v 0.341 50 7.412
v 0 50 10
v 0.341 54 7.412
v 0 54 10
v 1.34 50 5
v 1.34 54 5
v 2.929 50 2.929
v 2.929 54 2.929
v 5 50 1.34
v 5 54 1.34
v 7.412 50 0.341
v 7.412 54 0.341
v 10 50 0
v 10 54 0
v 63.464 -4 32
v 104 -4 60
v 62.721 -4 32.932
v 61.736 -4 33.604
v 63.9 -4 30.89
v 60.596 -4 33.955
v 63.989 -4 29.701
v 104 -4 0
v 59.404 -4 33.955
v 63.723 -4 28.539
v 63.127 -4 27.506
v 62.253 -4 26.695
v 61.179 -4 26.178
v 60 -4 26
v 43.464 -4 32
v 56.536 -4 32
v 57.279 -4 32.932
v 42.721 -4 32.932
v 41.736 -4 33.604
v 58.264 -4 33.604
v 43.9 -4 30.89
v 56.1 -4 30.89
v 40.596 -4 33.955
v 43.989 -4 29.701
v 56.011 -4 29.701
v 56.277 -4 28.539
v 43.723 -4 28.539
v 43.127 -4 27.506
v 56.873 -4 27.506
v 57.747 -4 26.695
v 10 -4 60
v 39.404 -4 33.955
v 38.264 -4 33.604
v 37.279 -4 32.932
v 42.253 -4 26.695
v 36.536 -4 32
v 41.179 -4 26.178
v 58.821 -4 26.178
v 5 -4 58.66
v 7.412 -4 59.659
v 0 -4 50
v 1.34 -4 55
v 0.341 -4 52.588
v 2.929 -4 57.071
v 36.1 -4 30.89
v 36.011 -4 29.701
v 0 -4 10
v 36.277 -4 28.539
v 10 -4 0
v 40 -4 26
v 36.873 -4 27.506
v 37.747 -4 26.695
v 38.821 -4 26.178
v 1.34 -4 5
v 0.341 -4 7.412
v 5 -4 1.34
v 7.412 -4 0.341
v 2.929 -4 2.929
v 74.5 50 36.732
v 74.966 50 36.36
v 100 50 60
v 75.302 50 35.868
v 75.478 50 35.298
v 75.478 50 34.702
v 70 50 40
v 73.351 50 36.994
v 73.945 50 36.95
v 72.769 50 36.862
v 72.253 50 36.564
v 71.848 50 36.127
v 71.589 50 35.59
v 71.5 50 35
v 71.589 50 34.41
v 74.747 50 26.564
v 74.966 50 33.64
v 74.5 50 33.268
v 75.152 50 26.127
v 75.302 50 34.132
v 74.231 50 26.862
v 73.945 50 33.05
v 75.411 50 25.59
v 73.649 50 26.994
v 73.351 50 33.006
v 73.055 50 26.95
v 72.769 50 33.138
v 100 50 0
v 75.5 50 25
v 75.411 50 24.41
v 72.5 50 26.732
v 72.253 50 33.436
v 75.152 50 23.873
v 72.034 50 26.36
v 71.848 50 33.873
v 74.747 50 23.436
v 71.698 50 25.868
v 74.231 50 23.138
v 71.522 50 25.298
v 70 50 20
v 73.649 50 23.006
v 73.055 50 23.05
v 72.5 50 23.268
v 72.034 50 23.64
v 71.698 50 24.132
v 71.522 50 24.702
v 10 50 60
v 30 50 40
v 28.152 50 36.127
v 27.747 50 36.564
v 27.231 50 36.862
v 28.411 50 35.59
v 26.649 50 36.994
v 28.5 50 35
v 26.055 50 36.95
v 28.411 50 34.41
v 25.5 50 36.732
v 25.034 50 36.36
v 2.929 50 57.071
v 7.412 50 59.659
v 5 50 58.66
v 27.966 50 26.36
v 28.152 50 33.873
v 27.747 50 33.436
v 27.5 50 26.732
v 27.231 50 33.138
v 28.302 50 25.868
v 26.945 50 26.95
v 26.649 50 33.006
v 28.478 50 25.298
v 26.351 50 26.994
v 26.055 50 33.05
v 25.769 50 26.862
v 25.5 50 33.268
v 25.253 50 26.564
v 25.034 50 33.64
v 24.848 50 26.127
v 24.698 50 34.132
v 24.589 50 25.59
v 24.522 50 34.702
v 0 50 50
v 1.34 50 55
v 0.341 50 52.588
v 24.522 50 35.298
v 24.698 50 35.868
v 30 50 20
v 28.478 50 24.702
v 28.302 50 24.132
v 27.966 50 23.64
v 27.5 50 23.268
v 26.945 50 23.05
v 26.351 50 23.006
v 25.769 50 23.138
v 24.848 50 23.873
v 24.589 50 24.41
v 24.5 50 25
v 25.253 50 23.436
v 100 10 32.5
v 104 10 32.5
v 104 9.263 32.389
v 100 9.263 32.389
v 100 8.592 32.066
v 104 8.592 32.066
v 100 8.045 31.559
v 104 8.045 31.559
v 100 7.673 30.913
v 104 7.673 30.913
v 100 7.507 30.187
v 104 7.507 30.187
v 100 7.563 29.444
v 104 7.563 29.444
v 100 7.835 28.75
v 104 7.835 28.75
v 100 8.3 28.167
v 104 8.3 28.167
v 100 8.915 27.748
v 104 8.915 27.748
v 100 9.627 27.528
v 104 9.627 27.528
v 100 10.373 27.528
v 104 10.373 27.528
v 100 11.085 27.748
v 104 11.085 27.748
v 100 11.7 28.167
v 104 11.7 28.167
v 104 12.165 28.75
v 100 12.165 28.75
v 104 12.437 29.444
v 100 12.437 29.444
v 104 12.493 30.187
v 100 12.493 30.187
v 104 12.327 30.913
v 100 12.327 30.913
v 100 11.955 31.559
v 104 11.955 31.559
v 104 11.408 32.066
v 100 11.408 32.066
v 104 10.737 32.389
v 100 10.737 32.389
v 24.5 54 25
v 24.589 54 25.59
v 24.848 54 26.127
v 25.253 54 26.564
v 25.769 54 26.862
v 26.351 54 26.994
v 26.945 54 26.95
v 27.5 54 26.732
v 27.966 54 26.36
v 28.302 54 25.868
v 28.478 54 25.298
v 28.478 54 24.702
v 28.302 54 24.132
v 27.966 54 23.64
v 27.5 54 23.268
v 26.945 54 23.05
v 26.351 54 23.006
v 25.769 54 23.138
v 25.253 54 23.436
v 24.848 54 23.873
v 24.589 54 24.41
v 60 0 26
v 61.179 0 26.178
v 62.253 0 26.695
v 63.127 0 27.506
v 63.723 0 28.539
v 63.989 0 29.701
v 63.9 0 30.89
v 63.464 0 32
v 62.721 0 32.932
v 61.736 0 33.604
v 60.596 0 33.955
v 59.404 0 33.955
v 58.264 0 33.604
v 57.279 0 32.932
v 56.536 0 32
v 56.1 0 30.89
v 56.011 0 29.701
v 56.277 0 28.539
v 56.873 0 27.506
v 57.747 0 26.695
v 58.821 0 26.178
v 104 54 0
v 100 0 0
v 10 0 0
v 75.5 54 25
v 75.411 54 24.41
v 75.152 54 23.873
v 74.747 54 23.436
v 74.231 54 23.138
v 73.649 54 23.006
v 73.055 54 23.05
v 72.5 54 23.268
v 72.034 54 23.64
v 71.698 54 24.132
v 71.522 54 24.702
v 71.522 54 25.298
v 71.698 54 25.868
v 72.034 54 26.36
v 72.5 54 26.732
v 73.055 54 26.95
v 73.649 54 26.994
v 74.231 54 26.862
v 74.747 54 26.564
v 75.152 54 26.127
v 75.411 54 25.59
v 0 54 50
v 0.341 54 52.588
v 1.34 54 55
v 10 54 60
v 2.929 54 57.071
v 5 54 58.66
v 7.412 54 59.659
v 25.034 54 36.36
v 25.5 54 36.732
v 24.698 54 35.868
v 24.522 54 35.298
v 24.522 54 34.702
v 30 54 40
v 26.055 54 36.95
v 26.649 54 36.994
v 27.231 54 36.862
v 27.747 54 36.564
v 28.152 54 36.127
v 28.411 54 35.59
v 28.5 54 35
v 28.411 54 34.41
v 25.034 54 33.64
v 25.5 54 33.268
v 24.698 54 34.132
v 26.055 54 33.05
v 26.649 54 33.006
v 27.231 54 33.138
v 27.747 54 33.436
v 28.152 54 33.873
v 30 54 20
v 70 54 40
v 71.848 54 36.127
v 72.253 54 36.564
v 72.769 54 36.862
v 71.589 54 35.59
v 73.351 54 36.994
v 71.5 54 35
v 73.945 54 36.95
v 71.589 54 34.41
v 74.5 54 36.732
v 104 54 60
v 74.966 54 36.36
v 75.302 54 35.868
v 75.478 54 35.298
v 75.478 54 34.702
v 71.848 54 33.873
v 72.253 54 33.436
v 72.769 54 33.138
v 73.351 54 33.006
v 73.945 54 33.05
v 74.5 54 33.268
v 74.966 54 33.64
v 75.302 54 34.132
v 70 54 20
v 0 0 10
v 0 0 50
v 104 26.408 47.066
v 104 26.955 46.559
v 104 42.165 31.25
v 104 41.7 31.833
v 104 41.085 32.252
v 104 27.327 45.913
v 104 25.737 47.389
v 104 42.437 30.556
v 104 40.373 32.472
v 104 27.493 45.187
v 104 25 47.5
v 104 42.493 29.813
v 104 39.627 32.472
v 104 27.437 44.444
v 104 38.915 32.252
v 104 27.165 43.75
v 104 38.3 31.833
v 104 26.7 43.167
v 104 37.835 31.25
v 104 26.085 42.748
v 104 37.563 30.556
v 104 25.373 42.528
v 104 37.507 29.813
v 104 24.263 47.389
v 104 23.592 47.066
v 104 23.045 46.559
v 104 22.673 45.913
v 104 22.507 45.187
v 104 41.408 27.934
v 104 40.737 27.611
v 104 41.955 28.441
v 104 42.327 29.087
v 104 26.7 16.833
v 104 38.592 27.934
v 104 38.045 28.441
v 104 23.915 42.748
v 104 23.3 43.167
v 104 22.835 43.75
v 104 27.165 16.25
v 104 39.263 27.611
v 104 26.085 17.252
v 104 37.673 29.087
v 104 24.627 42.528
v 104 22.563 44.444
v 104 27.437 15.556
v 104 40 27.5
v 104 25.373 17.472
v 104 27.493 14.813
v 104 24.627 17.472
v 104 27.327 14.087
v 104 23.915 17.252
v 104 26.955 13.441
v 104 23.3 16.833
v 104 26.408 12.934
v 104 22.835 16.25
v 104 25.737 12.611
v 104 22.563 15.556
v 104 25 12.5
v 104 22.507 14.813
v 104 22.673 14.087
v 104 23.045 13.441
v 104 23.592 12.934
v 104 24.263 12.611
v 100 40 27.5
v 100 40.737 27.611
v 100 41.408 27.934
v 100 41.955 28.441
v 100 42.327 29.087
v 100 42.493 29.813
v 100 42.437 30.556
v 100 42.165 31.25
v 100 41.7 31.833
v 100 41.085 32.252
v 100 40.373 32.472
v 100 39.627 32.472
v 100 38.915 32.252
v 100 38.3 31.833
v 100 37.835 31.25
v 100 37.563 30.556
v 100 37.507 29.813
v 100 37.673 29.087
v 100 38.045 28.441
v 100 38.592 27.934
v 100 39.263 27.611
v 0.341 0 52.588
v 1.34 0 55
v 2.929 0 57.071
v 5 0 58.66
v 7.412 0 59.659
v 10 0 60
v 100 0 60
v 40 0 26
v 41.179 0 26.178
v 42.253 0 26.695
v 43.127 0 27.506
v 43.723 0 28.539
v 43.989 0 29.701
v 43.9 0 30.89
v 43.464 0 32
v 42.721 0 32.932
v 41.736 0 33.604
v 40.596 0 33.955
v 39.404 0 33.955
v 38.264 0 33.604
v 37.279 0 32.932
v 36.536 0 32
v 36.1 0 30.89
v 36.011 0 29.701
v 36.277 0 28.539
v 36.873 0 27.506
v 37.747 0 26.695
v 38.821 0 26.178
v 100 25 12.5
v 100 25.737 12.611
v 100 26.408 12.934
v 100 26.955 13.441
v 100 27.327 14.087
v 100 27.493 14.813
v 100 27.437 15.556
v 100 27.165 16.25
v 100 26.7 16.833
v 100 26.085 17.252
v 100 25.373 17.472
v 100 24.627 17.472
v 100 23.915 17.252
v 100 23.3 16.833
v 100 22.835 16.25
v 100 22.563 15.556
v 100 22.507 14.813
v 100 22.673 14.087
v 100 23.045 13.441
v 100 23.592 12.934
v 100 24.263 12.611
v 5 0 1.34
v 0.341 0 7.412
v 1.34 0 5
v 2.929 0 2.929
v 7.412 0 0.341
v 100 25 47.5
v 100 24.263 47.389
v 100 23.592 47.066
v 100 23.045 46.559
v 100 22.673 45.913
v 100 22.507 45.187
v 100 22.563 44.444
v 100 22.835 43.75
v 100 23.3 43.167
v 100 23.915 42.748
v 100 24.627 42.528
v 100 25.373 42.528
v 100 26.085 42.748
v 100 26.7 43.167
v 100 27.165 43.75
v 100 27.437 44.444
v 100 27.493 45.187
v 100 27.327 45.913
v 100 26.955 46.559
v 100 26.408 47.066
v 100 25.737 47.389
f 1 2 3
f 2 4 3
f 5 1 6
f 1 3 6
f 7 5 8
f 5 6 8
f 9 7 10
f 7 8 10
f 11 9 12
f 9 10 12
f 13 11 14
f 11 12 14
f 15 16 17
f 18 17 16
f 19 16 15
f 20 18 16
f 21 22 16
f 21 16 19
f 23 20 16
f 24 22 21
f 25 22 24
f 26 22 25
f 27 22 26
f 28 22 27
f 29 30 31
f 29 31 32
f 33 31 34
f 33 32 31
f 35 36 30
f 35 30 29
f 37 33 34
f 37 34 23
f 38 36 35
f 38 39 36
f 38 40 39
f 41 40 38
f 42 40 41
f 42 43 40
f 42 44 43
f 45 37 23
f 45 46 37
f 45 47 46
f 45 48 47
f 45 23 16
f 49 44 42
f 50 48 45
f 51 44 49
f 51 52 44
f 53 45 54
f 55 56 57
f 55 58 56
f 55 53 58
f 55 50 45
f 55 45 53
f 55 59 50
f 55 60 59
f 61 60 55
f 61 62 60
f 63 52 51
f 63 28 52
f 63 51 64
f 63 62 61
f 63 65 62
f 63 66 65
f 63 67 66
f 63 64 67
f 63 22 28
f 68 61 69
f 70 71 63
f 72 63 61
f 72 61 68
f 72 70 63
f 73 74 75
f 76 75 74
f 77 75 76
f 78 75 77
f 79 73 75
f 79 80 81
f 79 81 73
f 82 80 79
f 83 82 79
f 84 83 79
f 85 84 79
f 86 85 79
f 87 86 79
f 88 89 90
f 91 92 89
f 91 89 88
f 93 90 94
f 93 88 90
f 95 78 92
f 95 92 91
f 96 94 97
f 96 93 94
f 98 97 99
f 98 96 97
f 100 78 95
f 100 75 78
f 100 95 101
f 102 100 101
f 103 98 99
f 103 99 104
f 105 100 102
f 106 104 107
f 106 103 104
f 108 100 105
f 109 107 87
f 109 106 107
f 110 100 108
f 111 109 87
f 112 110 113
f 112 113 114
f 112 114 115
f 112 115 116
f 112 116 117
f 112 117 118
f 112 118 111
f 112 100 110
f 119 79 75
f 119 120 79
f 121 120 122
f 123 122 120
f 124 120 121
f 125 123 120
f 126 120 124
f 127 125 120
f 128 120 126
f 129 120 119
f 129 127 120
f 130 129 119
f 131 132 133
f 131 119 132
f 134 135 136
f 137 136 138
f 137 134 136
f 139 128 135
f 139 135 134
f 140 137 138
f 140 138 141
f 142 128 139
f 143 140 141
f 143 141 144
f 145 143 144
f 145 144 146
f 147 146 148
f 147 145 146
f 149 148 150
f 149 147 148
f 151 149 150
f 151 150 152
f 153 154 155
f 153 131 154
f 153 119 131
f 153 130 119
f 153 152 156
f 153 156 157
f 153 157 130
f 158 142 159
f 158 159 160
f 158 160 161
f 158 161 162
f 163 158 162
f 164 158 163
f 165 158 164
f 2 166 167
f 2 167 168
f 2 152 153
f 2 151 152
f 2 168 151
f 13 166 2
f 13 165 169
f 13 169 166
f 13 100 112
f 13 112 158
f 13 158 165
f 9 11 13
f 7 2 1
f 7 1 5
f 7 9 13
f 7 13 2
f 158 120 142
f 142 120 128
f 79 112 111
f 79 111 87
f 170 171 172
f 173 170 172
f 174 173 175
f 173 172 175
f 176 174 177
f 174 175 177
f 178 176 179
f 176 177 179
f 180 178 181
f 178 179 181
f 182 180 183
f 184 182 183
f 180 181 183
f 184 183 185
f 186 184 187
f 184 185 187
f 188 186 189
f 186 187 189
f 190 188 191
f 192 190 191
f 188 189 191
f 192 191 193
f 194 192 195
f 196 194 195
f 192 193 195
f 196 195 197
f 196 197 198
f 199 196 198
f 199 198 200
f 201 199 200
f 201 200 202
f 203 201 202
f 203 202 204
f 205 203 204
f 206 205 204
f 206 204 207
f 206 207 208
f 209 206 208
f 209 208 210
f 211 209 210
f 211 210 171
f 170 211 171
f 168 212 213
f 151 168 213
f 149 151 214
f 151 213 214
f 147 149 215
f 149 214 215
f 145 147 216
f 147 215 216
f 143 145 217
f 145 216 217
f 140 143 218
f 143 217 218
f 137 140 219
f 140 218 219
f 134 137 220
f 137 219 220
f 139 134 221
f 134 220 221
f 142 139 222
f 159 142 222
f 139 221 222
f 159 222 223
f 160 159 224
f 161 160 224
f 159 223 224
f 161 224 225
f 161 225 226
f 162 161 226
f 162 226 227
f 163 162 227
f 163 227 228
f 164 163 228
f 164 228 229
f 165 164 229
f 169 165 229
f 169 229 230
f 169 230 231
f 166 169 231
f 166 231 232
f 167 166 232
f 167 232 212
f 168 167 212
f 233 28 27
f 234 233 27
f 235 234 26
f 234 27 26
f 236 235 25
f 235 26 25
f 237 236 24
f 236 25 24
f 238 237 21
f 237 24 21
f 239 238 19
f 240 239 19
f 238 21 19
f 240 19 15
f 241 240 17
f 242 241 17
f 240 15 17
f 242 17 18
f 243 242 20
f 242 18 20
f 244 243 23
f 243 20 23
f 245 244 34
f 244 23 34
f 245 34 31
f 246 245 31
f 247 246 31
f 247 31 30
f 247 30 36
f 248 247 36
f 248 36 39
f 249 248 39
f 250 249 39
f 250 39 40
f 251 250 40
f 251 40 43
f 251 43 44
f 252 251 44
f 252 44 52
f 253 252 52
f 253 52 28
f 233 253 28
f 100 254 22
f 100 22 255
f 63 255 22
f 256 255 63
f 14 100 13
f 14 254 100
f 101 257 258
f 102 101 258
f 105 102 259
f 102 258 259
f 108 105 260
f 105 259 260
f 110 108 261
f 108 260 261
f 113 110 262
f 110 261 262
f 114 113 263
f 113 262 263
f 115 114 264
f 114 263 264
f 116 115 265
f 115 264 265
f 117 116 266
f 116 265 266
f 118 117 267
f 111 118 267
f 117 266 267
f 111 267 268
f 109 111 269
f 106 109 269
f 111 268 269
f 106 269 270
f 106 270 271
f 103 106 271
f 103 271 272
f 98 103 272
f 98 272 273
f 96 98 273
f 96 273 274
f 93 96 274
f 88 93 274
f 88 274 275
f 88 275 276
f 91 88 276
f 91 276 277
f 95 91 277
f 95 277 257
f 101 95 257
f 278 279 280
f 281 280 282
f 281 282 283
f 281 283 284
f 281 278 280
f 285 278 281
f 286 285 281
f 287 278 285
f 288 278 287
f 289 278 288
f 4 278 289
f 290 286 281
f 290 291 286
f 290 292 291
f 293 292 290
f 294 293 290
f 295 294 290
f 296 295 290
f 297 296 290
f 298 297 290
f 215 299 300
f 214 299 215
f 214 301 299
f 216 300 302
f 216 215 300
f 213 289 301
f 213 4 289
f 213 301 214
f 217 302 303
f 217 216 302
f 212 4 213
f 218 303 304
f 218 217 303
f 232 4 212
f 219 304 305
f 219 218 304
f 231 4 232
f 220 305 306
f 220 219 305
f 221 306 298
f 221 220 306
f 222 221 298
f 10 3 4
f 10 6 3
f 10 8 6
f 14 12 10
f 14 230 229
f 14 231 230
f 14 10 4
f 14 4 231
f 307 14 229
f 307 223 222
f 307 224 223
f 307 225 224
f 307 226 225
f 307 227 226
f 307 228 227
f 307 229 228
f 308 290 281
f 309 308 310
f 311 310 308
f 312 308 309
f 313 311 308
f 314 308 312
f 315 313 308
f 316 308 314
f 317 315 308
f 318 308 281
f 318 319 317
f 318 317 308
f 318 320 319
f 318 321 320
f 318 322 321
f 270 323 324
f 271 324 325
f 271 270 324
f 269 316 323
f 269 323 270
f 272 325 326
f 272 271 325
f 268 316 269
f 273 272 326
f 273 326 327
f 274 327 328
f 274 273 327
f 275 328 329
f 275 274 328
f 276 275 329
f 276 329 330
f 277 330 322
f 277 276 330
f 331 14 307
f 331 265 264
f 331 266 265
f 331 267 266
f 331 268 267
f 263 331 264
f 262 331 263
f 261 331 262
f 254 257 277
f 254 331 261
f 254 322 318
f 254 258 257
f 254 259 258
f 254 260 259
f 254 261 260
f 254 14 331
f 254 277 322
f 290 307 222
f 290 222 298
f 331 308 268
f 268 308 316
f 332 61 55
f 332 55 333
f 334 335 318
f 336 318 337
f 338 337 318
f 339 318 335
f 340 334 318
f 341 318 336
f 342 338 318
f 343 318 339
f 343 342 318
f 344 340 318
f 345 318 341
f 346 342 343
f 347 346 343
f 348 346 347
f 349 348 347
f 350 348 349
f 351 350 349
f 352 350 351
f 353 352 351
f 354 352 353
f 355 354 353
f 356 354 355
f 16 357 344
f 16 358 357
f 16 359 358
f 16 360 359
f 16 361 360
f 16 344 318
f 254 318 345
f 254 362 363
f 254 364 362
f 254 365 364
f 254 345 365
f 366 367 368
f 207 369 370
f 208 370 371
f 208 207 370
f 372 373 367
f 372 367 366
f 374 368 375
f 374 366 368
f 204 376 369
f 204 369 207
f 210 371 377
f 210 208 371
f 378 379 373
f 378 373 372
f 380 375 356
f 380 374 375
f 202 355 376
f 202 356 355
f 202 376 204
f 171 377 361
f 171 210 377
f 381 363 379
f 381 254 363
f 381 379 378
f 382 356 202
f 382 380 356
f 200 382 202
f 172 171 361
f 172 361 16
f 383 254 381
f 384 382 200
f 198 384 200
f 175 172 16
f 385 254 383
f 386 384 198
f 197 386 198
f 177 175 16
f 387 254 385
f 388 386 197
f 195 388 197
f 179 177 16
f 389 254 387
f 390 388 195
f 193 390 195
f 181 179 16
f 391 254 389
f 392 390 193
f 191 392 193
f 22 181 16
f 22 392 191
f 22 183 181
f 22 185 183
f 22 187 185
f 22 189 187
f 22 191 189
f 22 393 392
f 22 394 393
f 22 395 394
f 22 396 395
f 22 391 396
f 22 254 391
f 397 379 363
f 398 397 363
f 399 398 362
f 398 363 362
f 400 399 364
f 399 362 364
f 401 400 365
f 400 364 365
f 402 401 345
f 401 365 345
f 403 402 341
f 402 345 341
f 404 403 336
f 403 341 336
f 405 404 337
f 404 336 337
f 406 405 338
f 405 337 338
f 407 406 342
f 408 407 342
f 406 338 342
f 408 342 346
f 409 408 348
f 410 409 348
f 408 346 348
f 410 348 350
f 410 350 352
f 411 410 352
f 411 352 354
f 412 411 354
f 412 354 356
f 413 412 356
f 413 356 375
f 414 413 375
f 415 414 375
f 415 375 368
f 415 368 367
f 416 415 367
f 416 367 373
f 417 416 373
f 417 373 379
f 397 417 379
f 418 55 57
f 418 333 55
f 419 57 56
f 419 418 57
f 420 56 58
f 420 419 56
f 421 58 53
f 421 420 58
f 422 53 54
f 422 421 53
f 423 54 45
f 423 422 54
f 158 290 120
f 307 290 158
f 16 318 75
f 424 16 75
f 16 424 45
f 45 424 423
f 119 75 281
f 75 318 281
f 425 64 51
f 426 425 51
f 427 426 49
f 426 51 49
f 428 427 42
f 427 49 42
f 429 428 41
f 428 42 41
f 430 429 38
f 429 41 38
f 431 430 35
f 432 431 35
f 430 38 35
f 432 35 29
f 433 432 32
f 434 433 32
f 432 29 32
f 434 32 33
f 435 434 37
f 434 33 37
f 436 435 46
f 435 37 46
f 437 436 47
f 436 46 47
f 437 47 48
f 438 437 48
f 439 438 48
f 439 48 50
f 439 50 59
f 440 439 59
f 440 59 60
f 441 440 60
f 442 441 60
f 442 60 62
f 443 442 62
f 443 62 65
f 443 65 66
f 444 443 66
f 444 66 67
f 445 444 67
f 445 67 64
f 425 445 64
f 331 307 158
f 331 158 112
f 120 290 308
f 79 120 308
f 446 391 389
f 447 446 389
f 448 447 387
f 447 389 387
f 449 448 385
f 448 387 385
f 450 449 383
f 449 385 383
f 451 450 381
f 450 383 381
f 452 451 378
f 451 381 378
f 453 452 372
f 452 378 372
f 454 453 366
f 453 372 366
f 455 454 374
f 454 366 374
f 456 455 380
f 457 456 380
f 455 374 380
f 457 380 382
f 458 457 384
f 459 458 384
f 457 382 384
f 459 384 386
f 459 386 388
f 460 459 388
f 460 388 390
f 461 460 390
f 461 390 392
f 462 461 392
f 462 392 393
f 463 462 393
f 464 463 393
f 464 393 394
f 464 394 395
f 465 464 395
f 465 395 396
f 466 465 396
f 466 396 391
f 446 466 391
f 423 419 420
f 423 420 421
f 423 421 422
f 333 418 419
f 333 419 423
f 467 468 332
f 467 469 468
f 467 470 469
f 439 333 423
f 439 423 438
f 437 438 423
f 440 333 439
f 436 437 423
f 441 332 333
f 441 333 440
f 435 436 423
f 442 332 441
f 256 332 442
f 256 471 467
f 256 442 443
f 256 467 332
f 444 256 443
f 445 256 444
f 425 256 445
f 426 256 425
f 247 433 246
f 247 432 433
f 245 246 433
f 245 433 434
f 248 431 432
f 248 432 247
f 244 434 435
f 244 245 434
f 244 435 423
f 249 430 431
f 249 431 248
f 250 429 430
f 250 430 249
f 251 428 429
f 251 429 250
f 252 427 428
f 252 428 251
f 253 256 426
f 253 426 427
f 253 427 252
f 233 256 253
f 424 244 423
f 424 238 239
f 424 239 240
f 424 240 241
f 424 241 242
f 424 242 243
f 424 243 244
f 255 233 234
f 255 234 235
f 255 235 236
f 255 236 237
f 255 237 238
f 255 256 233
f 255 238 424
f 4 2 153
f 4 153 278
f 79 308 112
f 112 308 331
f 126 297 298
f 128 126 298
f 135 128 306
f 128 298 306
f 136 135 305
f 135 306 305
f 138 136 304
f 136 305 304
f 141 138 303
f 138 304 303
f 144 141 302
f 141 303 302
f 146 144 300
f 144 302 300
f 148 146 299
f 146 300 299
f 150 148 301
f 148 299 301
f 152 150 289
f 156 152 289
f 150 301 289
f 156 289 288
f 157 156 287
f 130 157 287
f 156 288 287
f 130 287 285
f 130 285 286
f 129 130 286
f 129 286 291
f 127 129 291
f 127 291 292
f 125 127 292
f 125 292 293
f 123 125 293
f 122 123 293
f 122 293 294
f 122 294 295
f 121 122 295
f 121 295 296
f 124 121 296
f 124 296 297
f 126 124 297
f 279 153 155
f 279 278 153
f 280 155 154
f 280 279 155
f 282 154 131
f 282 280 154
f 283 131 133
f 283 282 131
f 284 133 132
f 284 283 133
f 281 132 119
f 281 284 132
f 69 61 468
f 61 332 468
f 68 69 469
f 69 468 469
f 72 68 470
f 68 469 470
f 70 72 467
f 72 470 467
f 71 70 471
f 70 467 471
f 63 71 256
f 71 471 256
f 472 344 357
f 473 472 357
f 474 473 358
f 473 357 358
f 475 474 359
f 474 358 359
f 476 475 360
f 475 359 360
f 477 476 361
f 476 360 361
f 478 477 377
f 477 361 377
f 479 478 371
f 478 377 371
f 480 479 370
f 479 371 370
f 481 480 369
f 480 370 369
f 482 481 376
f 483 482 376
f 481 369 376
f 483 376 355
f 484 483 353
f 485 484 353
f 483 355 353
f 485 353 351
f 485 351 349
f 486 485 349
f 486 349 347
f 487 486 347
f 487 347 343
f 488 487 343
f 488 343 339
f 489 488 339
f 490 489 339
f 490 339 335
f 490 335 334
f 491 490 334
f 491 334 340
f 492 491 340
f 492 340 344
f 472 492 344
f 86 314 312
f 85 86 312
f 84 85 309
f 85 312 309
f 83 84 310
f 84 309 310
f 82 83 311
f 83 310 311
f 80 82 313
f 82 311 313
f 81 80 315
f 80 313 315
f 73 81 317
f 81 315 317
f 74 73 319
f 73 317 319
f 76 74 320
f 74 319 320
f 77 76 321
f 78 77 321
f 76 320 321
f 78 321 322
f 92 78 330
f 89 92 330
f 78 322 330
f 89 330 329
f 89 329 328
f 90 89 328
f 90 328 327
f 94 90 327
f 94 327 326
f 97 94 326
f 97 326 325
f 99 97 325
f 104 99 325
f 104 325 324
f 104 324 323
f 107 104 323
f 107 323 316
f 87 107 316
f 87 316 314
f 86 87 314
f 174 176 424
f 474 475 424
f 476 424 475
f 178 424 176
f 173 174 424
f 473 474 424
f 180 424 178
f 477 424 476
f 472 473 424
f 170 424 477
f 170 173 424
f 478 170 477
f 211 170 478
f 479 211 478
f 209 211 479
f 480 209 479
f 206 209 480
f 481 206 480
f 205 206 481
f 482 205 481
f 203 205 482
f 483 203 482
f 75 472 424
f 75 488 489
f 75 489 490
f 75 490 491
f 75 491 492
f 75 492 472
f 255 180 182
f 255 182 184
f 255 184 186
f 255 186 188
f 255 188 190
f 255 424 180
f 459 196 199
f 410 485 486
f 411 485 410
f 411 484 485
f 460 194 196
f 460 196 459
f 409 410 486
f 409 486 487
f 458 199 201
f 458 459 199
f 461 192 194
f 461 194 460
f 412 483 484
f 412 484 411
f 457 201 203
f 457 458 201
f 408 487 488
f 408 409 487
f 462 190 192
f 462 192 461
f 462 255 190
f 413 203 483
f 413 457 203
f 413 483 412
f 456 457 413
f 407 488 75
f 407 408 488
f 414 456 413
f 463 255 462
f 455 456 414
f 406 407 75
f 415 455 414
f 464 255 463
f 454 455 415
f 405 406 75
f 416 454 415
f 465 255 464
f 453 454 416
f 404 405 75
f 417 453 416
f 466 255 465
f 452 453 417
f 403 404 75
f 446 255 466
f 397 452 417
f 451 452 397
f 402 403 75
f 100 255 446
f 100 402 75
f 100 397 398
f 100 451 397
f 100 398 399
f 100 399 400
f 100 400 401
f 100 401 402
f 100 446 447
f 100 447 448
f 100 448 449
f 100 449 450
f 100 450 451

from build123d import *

# Parameters (mm, degrees)
EKSTR_ZYON_NCE1_DEPTH = 60
RADYUS1_R             = 10
KES_EKSTR_ZYON3_REACH = 133.651
IZIM3_R               = 2.5
KES_EKSTR_ZYON4_REACH = 135.342
IZIM4_R               = 2
IZIM4_W               = 40
IZIM4_H               = 20
KES_EKSTR_ZYON5_REACH = 135.342
IZIM5_R               = 4


with BuildPart() as part:
    # Çizim1 → Ekstrüzyon-İnce1 (new body)
    with BuildSketch(Plane.XY):
        Polygon((0, 0), (100, 0), (100, 50), (0, 50), (0, 54), (104, 54), (104, -4), (0, -4), align=None)
    extrude(amount=EKSTR_ZYON_NCE1_DEPTH)

    # Radyus1
    radyus1_edges = [part.edges().sort_by_distance(p)[0] for p in [
        (0, -2, 60),
        (0, 52, 60),
        (0, -2, 0),
        (0, 52, 0),
    ]]
    fillet(radyus1_edges, radius=RADYUS1_R)

    # Çizim3 → Kes-Ekstrüzyon3 (cut, up to next)
    with BuildSketch(Plane(origin=(104, 0, 0), x_dir=(0, 0, -1), z_dir=(1, 0, 0)), mode=Mode.PRIVATE) as kes_ekstr_zyon3_sk1:
        with Locations((-30, 40)):
            Circle(IZIM3_R)
    kes_ekstr_zyon3_tool1 = extrude(kes_ekstr_zyon3_sk1.sketch, amount=-KES_EKSTR_ZYON3_REACH, mode=Mode.PRIVATE) & part.part
    # Çizim3 → Kes-Ekstrüzyon3 (cut, up to next)
    with BuildSketch(Plane(origin=(104, 0, 0), x_dir=(0, 0, -1), z_dir=(1, 0, 0)), mode=Mode.PRIVATE) as kes_ekstr_zyon3_sk2:
        with Locations(Location((-30, 10, 0), (0, 0, 180))):
            Circle(IZIM3_R)
    kes_ekstr_zyon3_tool2 = extrude(kes_ekstr_zyon3_sk2.sketch, amount=-KES_EKSTR_ZYON3_REACH, mode=Mode.PRIVATE) & part.part
    # Çizim3 → Kes-Ekstrüzyon3 (cut, up to next)
    with BuildSketch(Plane(origin=(104, 0, 0), x_dir=(0, 0, -1), z_dir=(1, 0, 0)), mode=Mode.PRIVATE) as kes_ekstr_zyon3_sk3:
        with Locations((-15, 25)):
            Circle(IZIM3_R)
    kes_ekstr_zyon3_tool3 = extrude(kes_ekstr_zyon3_sk3.sketch, amount=-KES_EKSTR_ZYON3_REACH, mode=Mode.PRIVATE) & part.part
    # Çizim3 → Kes-Ekstrüzyon3 (cut, up to next)
    with BuildSketch(Plane(origin=(104, 0, 0), x_dir=(0, 0, -1), z_dir=(1, 0, 0)), mode=Mode.PRIVATE) as kes_ekstr_zyon3_sk4:
        with Locations(Location((-45, 25, 0), (0, 0, 180))):
            Circle(IZIM3_R)
    kes_ekstr_zyon3_tool4 = extrude(kes_ekstr_zyon3_sk4.sketch, amount=-KES_EKSTR_ZYON3_REACH, mode=Mode.PRIVATE) & part.part
    add(kes_ekstr_zyon3_tool1.solids().sort_by_distance((104, 40, 30))[0], mode=Mode.SUBTRACT)
    add(kes_ekstr_zyon3_tool2.solids().sort_by_distance((104, 10, 30))[0], mode=Mode.SUBTRACT)
    add(kes_ekstr_zyon3_tool3.solids().sort_by_distance((104, 25, 15))[0], mode=Mode.SUBTRACT)
    add(kes_ekstr_zyon3_tool4.solids().sort_by_distance((104, 25, 45))[0], mode=Mode.SUBTRACT)

    # Çizim4 → Kes-Ekstrüzyon4 (cut, up to next)
    with BuildSketch(Plane(origin=(0, 54, 0), x_dir=(1, 0, 0), z_dir=(0, 1, 0)), mode=Mode.PRIVATE) as kes_ekstr_zyon4_sk1:
        with Locations(Location((26.5, -25, 0), (0, 0, 180))):
            Circle(IZIM4_R)
    kes_ekstr_zyon4_tool1 = extrude(kes_ekstr_zyon4_sk1.sketch, amount=-KES_EKSTR_ZYON4_REACH, mode=Mode.PRIVATE) & part.part
    # Çizim4 → Kes-Ekstrüzyon4 (cut, up to next)
    with BuildSketch(Plane(origin=(0, 54, 0), x_dir=(1, 0, 0), z_dir=(0, 1, 0)), mode=Mode.PRIVATE) as kes_ekstr_zyon4_sk2:
        with Locations((26.5, -35)):
            Circle(IZIM4_R)
    kes_ekstr_zyon4_tool2 = extrude(kes_ekstr_zyon4_sk2.sketch, amount=-KES_EKSTR_ZYON4_REACH, mode=Mode.PRIVATE) & part.part
    # Çizim4 → Kes-Ekstrüzyon4 (cut, up to next)
    with BuildSketch(Plane(origin=(0, 54, 0), x_dir=(1, 0, 0), z_dir=(0, 1, 0)), mode=Mode.PRIVATE) as kes_ekstr_zyon4_sk3:
        with Locations(Location((73.5, -35, 0), (0, 0, 180))):
            Circle(IZIM4_R)
    kes_ekstr_zyon4_tool3 = extrude(kes_ekstr_zyon4_sk3.sketch, amount=-KES_EKSTR_ZYON4_REACH, mode=Mode.PRIVATE) & part.part
    # Çizim4 → Kes-Ekstrüzyon4 (cut, up to next)
    with BuildSketch(Plane(origin=(0, 54, 0), x_dir=(1, 0, 0), z_dir=(0, 1, 0)), mode=Mode.PRIVATE) as kes_ekstr_zyon4_sk4:
        with Locations((73.5, -25)):
            Circle(IZIM4_R)
    kes_ekstr_zyon4_tool4 = extrude(kes_ekstr_zyon4_sk4.sketch, amount=-KES_EKSTR_ZYON4_REACH, mode=Mode.PRIVATE) & part.part
    # Çizim4 → Kes-Ekstrüzyon4 (cut, up to next)
    with BuildSketch(Plane(origin=(0, 54, 0), x_dir=(1, 0, 0), z_dir=(0, 1, 0)), mode=Mode.PRIVATE) as kes_ekstr_zyon4_sk5:
        with Locations((50, -30)):
            Rectangle(IZIM4_W, IZIM4_H)
    kes_ekstr_zyon4_tool5 = extrude(kes_ekstr_zyon4_sk5.sketch, amount=-KES_EKSTR_ZYON4_REACH, mode=Mode.PRIVATE) & part.part
    add(kes_ekstr_zyon4_tool1.solids().sort_by_distance((26.5, 54, 25))[0], mode=Mode.SUBTRACT)
    add(kes_ekstr_zyon4_tool2.solids().sort_by_distance((26.5, 54, 35))[0], mode=Mode.SUBTRACT)
    add(kes_ekstr_zyon4_tool3.solids().sort_by_distance((73.5, 54, 35))[0], mode=Mode.SUBTRACT)
    add(kes_ekstr_zyon4_tool4.solids().sort_by_distance((73.5, 54, 25))[0], mode=Mode.SUBTRACT)
    add(kes_ekstr_zyon4_tool5.solids().sort_by_distance((50, 54, 30))[0], mode=Mode.SUBTRACT)

    # Çizim5 → Kes-Ekstrüzyon5 (cut, up to next)
    with BuildSketch(Plane.XZ.offset(4), mode=Mode.PRIVATE) as kes_ekstr_zyon5_sk1:
        with Locations(Location((40, 30, 0), (0, 0, 270))):
            Circle(IZIM5_R)
    kes_ekstr_zyon5_tool1 = extrude(kes_ekstr_zyon5_sk1.sketch, amount=-KES_EKSTR_ZYON5_REACH, mode=Mode.PRIVATE) & part.part
    # Çizim5 → Kes-Ekstrüzyon5 (cut, up to next)
    with BuildSketch(Plane.XZ.offset(4), mode=Mode.PRIVATE) as kes_ekstr_zyon5_sk2:
        with Locations(Location((60, 30, 0), (0, 0, 270))):
            Circle(IZIM5_R)
    kes_ekstr_zyon5_tool2 = extrude(kes_ekstr_zyon5_sk2.sketch, amount=-KES_EKSTR_ZYON5_REACH, mode=Mode.PRIVATE) & part.part
    add(kes_ekstr_zyon5_tool1.solids().sort_by_distance((40, -4, 30))[0], mode=Mode.SUBTRACT)
    add(kes_ekstr_zyon5_tool2.solids().sort_by_distance((60, -4, 30))[0], mode=Mode.SUBTRACT)


solid = part.part
